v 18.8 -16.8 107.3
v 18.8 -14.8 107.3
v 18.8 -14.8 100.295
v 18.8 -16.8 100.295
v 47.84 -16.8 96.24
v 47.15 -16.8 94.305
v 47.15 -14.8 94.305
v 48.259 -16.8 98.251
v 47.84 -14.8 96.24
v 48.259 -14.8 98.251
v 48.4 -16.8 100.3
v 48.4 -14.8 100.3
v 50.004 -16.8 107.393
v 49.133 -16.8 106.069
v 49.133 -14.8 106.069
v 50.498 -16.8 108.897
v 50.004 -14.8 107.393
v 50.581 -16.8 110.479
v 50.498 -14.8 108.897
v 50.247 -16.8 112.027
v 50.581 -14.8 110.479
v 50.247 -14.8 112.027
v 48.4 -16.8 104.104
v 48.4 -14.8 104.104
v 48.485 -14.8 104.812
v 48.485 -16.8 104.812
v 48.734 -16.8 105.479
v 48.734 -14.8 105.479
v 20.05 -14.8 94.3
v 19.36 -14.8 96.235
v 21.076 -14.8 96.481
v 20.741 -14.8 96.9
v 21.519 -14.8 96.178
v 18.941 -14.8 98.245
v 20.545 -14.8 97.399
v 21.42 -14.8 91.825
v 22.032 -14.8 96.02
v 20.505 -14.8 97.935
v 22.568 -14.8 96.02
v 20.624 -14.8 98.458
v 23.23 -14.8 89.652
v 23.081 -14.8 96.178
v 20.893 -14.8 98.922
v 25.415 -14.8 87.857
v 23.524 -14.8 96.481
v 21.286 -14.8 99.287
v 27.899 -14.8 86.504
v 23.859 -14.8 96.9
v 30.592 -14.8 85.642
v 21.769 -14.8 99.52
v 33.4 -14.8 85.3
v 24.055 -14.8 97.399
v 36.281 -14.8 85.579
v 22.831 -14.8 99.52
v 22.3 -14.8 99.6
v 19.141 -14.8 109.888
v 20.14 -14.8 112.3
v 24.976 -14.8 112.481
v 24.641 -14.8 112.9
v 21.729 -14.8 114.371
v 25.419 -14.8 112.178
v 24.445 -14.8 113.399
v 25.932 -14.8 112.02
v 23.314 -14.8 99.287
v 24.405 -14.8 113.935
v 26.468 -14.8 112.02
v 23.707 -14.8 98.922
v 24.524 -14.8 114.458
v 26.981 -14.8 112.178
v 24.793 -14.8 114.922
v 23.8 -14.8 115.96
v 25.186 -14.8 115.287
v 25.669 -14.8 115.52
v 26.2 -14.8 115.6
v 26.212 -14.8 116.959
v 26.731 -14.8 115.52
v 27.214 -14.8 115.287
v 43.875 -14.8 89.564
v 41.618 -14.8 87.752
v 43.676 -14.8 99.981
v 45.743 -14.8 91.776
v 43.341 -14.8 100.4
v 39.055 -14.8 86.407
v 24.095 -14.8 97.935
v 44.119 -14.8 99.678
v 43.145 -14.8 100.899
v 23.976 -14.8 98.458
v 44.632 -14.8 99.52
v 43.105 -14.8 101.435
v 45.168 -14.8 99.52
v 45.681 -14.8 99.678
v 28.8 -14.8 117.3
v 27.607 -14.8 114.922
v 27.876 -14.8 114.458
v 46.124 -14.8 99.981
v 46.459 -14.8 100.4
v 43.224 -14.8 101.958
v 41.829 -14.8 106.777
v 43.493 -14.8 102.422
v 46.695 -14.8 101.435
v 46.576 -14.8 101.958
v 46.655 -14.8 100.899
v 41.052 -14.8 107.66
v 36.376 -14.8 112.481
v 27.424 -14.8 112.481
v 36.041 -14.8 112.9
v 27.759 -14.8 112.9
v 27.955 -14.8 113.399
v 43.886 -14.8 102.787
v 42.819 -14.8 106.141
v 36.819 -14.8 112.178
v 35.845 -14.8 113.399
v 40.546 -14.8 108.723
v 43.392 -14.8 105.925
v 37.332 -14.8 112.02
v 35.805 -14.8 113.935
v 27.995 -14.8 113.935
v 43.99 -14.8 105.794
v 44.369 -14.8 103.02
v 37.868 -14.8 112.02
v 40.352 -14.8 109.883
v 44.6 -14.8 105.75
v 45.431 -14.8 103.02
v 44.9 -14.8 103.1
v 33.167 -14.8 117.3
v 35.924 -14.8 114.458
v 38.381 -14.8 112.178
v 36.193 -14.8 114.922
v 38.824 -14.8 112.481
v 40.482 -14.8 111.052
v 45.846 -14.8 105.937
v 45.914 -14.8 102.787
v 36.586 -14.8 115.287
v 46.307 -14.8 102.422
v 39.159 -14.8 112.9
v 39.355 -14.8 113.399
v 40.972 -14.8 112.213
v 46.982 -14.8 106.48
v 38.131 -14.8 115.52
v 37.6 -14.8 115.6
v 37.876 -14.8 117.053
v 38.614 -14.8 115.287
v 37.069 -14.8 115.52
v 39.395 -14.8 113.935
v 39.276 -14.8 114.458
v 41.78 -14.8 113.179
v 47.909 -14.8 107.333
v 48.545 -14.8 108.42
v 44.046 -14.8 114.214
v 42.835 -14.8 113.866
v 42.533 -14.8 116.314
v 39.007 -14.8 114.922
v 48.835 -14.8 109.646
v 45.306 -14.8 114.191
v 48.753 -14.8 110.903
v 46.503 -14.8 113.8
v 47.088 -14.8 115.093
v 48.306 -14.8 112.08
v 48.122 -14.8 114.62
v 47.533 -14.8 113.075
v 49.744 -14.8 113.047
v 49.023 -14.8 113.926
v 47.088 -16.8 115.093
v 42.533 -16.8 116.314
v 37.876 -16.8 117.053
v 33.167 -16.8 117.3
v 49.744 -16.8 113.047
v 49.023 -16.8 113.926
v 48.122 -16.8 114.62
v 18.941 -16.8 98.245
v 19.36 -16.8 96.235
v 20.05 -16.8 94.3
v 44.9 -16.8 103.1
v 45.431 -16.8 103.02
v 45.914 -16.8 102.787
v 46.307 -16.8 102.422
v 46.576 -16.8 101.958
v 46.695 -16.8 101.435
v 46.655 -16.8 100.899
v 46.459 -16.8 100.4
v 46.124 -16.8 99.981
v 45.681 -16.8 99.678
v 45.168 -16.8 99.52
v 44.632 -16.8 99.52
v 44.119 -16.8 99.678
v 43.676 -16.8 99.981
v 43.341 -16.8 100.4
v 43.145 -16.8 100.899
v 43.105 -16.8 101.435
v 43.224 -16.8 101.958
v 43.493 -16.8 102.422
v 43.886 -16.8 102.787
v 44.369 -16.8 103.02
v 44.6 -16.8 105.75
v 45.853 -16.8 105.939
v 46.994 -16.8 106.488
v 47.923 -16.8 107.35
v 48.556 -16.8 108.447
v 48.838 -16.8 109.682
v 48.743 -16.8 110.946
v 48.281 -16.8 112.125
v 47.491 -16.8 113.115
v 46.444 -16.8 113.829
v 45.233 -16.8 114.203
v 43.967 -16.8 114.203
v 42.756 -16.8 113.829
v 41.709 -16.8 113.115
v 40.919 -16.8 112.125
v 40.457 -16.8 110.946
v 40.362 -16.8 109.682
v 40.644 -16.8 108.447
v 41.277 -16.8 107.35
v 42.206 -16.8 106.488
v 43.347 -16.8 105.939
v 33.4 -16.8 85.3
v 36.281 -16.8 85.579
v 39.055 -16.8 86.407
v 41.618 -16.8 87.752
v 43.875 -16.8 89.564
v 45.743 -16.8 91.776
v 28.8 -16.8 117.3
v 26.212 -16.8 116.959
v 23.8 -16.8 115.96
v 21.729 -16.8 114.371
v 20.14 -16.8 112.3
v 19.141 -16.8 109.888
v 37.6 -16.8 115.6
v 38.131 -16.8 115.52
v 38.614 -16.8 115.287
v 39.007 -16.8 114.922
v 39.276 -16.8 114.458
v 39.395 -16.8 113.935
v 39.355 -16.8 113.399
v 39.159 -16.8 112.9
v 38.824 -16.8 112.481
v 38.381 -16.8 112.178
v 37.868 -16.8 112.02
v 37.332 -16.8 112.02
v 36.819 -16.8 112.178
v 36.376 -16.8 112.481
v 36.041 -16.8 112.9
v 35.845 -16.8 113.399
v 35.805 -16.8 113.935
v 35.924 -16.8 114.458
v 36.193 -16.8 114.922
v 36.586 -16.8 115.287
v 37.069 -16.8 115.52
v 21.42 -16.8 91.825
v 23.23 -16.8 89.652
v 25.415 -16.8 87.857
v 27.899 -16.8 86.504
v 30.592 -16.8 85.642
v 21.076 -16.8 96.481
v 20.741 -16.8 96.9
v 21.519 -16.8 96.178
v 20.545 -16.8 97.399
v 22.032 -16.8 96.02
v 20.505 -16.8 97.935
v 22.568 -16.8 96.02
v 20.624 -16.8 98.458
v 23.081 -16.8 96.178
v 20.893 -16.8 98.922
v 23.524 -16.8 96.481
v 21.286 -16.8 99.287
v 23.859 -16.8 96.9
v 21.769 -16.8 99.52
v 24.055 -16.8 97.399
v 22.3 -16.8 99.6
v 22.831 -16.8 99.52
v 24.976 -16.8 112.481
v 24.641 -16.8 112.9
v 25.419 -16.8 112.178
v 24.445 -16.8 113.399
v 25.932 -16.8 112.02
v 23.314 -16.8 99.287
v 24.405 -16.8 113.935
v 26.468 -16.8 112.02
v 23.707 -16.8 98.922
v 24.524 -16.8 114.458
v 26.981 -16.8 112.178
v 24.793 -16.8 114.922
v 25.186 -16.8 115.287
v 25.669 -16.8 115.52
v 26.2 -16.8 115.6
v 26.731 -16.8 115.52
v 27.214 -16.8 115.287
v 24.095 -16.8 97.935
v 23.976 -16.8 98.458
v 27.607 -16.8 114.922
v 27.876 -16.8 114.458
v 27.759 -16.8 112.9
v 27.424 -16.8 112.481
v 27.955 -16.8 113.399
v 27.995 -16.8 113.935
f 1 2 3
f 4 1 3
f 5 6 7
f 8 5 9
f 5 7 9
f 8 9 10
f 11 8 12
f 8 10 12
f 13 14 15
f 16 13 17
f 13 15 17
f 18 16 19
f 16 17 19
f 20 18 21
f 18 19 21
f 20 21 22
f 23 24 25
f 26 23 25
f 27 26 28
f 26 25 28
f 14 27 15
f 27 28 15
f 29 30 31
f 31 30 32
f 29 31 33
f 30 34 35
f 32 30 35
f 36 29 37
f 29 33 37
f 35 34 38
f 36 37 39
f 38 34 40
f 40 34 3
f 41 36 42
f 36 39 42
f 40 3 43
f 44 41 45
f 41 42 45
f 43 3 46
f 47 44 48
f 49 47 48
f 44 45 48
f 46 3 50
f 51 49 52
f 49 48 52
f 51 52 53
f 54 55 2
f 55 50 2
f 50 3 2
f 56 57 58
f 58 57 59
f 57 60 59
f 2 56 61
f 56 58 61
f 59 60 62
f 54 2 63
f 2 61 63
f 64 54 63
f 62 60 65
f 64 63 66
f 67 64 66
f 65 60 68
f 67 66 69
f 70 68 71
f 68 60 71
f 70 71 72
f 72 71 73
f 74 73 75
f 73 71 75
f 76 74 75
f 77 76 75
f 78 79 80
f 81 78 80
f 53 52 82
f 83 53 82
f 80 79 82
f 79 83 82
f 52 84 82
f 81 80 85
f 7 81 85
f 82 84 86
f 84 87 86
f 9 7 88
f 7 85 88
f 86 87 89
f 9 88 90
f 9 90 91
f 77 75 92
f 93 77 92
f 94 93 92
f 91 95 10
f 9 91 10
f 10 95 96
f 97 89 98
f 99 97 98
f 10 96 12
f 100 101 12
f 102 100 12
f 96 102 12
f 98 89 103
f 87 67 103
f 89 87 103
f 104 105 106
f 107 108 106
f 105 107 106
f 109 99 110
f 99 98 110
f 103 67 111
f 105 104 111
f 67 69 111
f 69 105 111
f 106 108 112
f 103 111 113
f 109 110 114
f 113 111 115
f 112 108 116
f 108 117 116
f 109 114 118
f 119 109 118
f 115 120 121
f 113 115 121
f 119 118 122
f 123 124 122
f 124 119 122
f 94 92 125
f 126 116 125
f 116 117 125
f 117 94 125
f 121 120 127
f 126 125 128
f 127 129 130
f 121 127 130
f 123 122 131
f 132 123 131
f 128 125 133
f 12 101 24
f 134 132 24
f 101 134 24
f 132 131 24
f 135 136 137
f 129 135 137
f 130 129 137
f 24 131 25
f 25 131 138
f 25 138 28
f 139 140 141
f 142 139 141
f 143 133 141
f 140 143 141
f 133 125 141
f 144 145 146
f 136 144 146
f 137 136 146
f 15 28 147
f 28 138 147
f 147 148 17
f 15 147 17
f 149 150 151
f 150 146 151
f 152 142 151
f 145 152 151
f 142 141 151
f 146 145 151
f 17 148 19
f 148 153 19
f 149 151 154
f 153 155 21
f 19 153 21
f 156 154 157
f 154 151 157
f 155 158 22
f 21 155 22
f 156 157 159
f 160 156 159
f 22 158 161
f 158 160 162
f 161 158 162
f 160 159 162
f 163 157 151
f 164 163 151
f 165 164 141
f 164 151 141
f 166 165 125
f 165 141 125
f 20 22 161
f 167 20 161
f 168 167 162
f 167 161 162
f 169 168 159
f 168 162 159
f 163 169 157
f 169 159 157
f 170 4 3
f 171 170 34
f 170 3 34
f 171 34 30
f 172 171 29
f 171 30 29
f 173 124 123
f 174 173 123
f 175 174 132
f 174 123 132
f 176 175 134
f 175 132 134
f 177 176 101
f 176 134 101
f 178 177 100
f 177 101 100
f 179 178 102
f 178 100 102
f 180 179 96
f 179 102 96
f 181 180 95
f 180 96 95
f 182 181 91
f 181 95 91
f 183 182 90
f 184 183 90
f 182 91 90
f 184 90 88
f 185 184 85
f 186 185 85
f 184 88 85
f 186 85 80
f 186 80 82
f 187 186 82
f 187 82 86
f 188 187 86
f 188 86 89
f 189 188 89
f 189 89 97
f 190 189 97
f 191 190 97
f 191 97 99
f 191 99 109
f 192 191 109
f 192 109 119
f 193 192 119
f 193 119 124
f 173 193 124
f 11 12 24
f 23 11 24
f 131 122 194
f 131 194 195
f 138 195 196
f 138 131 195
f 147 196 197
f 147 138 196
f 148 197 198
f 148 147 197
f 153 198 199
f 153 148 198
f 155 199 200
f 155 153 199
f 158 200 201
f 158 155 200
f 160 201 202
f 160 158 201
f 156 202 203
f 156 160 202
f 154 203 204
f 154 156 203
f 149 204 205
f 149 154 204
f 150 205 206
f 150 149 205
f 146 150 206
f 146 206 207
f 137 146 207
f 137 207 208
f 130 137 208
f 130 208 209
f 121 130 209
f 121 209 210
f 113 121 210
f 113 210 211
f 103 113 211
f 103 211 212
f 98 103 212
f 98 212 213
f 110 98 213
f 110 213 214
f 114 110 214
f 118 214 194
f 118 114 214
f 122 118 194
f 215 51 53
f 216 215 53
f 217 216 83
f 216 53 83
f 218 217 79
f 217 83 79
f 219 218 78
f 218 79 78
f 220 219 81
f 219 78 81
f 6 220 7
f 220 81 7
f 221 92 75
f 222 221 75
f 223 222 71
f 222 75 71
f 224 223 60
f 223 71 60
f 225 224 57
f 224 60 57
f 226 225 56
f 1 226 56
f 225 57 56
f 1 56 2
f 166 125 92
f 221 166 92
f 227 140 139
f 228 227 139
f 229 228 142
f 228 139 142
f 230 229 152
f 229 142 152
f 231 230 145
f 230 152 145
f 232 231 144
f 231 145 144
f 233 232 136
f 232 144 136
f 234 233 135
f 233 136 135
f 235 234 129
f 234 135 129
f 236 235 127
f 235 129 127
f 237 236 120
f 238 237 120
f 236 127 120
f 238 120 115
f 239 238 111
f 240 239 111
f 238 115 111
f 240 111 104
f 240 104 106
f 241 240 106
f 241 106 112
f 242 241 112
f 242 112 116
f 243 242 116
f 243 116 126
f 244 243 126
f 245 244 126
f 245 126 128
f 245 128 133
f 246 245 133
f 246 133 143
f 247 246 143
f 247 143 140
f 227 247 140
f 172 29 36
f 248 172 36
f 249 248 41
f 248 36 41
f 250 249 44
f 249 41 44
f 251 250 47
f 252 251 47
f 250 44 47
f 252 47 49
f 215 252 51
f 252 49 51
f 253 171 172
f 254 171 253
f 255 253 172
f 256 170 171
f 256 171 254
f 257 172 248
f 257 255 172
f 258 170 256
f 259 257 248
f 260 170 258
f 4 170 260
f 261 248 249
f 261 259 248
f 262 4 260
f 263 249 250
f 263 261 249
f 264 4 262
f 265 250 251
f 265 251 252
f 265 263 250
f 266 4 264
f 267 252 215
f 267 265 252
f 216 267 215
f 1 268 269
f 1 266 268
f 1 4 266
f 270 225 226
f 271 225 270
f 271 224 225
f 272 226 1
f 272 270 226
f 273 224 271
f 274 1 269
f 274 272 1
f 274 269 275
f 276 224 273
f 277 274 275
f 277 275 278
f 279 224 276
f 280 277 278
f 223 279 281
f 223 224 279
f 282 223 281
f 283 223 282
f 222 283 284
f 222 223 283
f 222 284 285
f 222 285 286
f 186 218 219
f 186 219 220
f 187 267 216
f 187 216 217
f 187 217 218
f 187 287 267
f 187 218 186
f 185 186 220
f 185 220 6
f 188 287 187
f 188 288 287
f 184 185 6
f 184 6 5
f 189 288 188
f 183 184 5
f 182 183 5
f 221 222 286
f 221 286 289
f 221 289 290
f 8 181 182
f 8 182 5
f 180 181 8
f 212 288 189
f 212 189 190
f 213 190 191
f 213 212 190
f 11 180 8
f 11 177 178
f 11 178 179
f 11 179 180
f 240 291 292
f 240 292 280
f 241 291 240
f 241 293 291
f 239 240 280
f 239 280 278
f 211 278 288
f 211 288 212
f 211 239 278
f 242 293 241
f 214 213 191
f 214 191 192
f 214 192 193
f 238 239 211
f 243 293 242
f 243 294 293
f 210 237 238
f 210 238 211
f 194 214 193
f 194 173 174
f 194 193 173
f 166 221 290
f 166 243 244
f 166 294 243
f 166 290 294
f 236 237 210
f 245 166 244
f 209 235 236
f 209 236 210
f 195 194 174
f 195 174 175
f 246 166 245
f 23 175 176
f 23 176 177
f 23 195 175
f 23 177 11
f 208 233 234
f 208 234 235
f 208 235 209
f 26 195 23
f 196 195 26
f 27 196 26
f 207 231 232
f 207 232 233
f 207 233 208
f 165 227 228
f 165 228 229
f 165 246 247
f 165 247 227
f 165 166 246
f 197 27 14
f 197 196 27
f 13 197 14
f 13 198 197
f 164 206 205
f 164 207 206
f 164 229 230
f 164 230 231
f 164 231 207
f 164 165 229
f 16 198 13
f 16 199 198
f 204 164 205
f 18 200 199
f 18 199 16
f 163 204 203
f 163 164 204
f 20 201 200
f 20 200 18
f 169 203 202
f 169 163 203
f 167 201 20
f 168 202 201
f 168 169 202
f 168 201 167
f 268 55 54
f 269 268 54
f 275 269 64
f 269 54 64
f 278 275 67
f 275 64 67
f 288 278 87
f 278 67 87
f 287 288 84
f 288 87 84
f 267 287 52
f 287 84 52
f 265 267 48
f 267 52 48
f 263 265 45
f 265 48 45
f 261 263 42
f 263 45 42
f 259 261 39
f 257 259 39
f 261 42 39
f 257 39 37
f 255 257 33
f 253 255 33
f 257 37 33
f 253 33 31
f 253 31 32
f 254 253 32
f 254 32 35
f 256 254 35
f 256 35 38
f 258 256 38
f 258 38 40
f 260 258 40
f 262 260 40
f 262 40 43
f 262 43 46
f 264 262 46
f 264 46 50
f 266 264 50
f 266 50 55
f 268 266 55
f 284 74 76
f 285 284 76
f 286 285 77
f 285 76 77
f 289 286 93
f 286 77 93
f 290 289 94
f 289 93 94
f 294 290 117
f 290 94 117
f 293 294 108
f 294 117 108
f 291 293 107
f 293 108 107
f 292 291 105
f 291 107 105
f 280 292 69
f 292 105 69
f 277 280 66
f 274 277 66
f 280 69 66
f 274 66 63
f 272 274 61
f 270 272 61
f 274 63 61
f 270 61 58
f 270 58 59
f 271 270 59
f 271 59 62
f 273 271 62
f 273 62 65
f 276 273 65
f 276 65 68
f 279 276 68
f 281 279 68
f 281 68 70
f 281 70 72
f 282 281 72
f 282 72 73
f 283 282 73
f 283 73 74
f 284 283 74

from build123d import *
from build123d.topology import SkipClean

# Parameters (mm, degrees)
SZKIC1_W                    = 15.6
SZKIC1_H                    = 25
SZKIC1_R                    = 1.8
SZKIC1_R_2                  = 1.5
DODANIE_WYCI_GNI_CIE1_DEPTH = 3
DODANIE_WYCI_GNI_CIE2_START = -10.5
SZKIC1_3_R                  = 1.8
SZKIC1_3_R_2                = 1.5
DODANIE_WYCI_GNI_CIE2_DEPTH = 10.5
ZAOKR_GLENIE1_R             = 10
ZAOKR_GLENIE6_R             = 45
ZAOKR_GLENIE7_R             = 5
ZAOKR_GLENIE8_R             = 15
ZAOKR_GLENIE10_R            = 0.2
SZKIC5_R                    = 4.25
WYTNIJ_WYCI_GNI_CIE3_DEPTH  = 1
ZAOKR_GLENIE11_R            = 1
ZAOKR_GLENIE12_START        = -10.5
ZAOKR_GLENIE12_DEPTH        = 13.5
ZAOKR_GLENIE13_R            = 3
DODANIE_WYCI_GNI_CIE3_START = 4.3
SZKIC8_R                    = 1.5
DODANIE_WYCI_GNI_CIE3_DEPTH = 4.3
WYTNIJ_WYCI_GNI_CIE5_DEPTH  = 129.982518339
SZKIC10_R                   = 3.3
WYTNIJ_WYCI_GNI_CIE6_DEPTH  = 1.6
SZKIC11_R                   = 1.8
DODANIE_WYCI_GNI_CIE4_DEPTH = 0.2
SZKIC12_R                   = 1.5
SZKIC12_R_2                 = 1.8
SZKIC12_R_3                 = 3.3
DODANIE_WYCI_GNI_CIE5_DEPTH = 0.2
ZAOKR_GLENIE14_R            = 3
SZKIC13_R                   = 1.5
SZKIC13_R_2                 = 4.25
DODANIE_WYCI_GNI_CIE6_DEPTH = 2
WYTNIJ_WYCI_GNI_CIE7_START  = -19.8
WYTNIJ_WYCI_GNI_CIE7_DEPTH  = 17.8
SZKIC15_R                   = 1.8
WYTNIJ_WYCI_GNI_CIE8_DEPTH  = 128.764040324


with BuildPart() as part:
    # Szkic1 → Dodanie-wyciągnięcie1 (new body)
    # profile 1 of 2: a face of its own
    with BuildSketch(Plane(origin=(0, 0, 0), x_dir=(1, 0, 0), z_dir=(0, 1, 0))):
        with Locations((4, -97.8)):
            Rectangle(SZKIC1_W, SZKIC1_H)
        with Locations(Location((4, -105.3, 0), (0, 0, 270))):
            Circle(SZKIC1_R, mode=Mode.SUBTRACT)
        with Locations(Location((4, -90.3, 0), (0, 0, 270))):
            Circle(SZKIC1_R, mode=Mode.SUBTRACT)
    # profile 2 of 2: a face of its own
    with BuildSketch(Plane(origin=(0, 0, 0), x_dir=(1, 0, 0), z_dir=(0, 1, 0))):
        with BuildLine():
            Line((11.8, -110.3), (-3.8, -110.3))
            Line((-3.8, -110.3), (-3.8, -85.3))
            Line((-3.8, -85.3), (-10.8, -85.3))
            Line((-10.8, -85.3), (-10.8, -105.356725294))
            ThreePointArc((-10.8, -105.356725294), (-13, -110), (-10.8, -114.643274706))
            Line((-10.8, -114.643274706), (-10.8, -117.3))
            Line((-10.8, -117.3), (18.8, -117.3))
            Line((18.8, -117.3), (18.8, -85.3))
            Line((18.8, -85.3), (11.8, -85.3))
            Line((11.8, -85.3), (11.8, -110.3))
        make_face()
        with Locations(Location((-7, -110, 0), (0, 0, 270))):
            Circle(SZKIC1_R, mode=Mode.SUBTRACT)
        with Locations(Location((0, -113.8, 0), (0, 0, 270))):
            Circle(SZKIC1_R_2, mode=Mode.SUBTRACT)
        with Locations(Location((11.4, -113.8, 0), (0, 0, 270))):
            Circle(SZKIC1_R_2, mode=Mode.SUBTRACT)
        with Locations(Location((-7.3, -101.3, 0), (0, 0, 270))):
            Circle(SZKIC1_R_2, mode=Mode.SUBTRACT)
        with Locations(Location((15.3, -97.8, 0), (0, 0, 270))):
            Circle(SZKIC1_R_2, mode=Mode.SUBTRACT)
    extrude(amount=DODANIE_WYCI_GNI_CIE1_DEPTH)

    # Szkic1<3> → Dodanie-wyciągnięcie2 (add)
    with BuildSketch(Plane(origin=(0, 0, 0), x_dir=(1, 0, 0), z_dir=(0, 1, 0)).offset(DODANIE_WYCI_GNI_CIE2_START)):
        with BuildLine():
            Line((11.8, -110.3), (-3.8, -110.3))
            Line((-3.8, -110.3), (-3.8, -85.3))
            Line((-3.8, -85.3), (-10.8, -85.3))
            Line((-10.8, -85.3), (-10.8, -105.356725294))
            ThreePointArc((-10.8, -105.356725294), (-13, -110), (-10.8, -114.643274706))
            Line((-10.8, -114.643274706), (-10.8, -117.3))
            Line((-10.8, -117.3), (18.8, -117.3))
            Line((18.8, -117.3), (18.8, -85.3))
            Line((18.8, -85.3), (11.8, -85.3))
            Line((11.8, -85.3), (11.8, -110.3))
        make_face()
        with Locations(Location((-7, -110, 0), (0, 0, 270))):
            Circle(SZKIC1_3_R, mode=Mode.SUBTRACT)
        with Locations(Location((0, -113.8, 0), (0, 0, 270))):
            Circle(SZKIC1_3_R_2, mode=Mode.SUBTRACT)
        with Locations(Location((11.4, -113.8, 0), (0, 0, 270))):
            Circle(SZKIC1_3_R_2, mode=Mode.SUBTRACT)
        with Locations(Location((-7.3, -101.3, 0), (0, 0, 270))):
            Circle(SZKIC1_3_R_2, mode=Mode.SUBTRACT)
        with Locations(Location((15.3, -97.8, 0), (0, 0, 270))):
            Circle(SZKIC1_3_R_2, mode=Mode.SUBTRACT)
    extrude(amount=DODANIE_WYCI_GNI_CIE2_DEPTH)

    # Zaokrąglenie1
    zaokr_glenie1_edges = [part.edges().sort_by_distance(p)[0] for p in [
        (18.8, -3.75, 117.3),
    ]]
    fillet(zaokr_glenie1_edges, radius=ZAOKR_GLENIE1_R)

    # Zaokrąglenie6
    # the kernel refuses this fillet: 45 mm, written as the material it takes off along each edge
    with BuildSketch(Plane(origin=(-10.8, 41.082729611, 117.3), x_dir=(1, 0, 0), z_dir=(0, -1, 0))) as zaokr_glenie6_piece_1:
        with BuildLine():
            CenterArc((15.233091844, -45), ZAOKR_GLENIE6_R, 90, 19.78631313)
            Line((0, -2.656725294), (0, 0))
            Line((0, 0), (15.233091844, 0))
        make_face()
    extrude(amount=89.665459221, mode=Mode.SUBTRACT)

    # Zaokrąglenie7
    zaokr_glenie7_edges = [part.edges().sort_by_distance(p)[0] for p in [
        (-10.8, -3.75, 114.643274706),
    ]]
    fillet(zaokr_glenie7_edges, radius=ZAOKR_GLENIE7_R)

    # Zaokrąglenie8
    zaokr_glenie8_edges = [part.edges().sort_by_distance(p)[0] for p in [
        (-10.8, -3.75, 85.3),
    ]]
    fillet(zaokr_glenie8_edges, radius=ZAOKR_GLENIE8_R)

    # Zaokrąglenie10
    zaokr_glenie10_edges = [part.edges().sort_by_distance(p)[0] for p in [
        (-3.8, -5.25, 110.3),
        (11.8, -5.25, 110.3),
    ]]
    fillet(zaokr_glenie10_edges, radius=ZAOKR_GLENIE10_R)

    # Szkic5 → Wytnij-wyciągnięcie3 (cut)
    with BuildSketch(Plane.XZ.offset(10.5)):
        with Locations((-7, 110)):
            Circle(SZKIC5_R)
    extrude(amount=-WYTNIJ_WYCI_GNI_CIE3_DEPTH, mode=Mode.SUBTRACT)

    # Zaokrąglenie11
    zaokr_glenie11_edges = [part.edges().sort_by_distance(p)[0] for p in [
        (-3.8, -10, 107.203126746),
        (-2.760601458, -10, 110.3),
    ]]
    fillet(zaokr_glenie11_edges, radius=ZAOKR_GLENIE11_R)

    # Zaokrąglenie12: read off the stored shape, not the designer's step
    # Zaokrąglenie12 outline → Zaokrąglenie12 (cut)
    with BuildSketch(Plane(origin=(0, 0, 0), x_dir=(1, 0, 0), z_dir=(0, 1, 0)).offset(ZAOKR_GLENIE12_START)):
        with BuildLine():
            Line((18.8, -85.3), (4.2, -85.3))
            ThreePointArc((4.2, -85.3), (14.54709263, -89.83044095), (18.8, -100.294665718))
            Line((18.8, -100.294665718), (18.8, -85.3))
        make_face()
    extrude(amount=ZAOKR_GLENIE12_DEPTH, mode=Mode.SUBTRACT)

    # Zaokrąglenie13
    zaokr_glenie13_edges = [part.edges().sort_by_distance(p)[0] for p in [
        (-3.8, -5.25, 87.61142246),
        (11.8, -5.25, 87.606088178),
    ]]
    fillet(zaokr_glenie13_edges, radius=ZAOKR_GLENIE13_R)

    # Szkic8 → Dodanie-wyciągnięcie3 (add)
    with SkipClean():  # the faces are left unmerged after this step: merging them gives an invalid solid
        with BuildSketch(Plane.XZ.offset(10.5).offset(DODANIE_WYCI_GNI_CIE3_START)):
            with BuildLine():
                Line((-3.8, 95.504168477), (-3.8, 105.233187648))
                ThreePointArc((-3.8, 105.233187648), (-4.261041569, 106.075520011), (-5.219047619, 106.141151905))
                ThreePointArc((-5.219047619, 106.141151905), (-10.837760193, 111.825950903), (-2.88235573, 111.052380952))
                ThreePointArc((-2.88235573, 111.052380952), (-2.52684194, 110.510183867), (-1.913498255, 110.3))
                Line((-1.913498255, 110.3), (11.6, 110.3))
                ThreePointArc((11.6, 110.3), (11.741421356, 110.241421356), (11.8, 110.1))
                Line((11.8, 110.1), (11.8, 95.498834195))
                ThreePointArc((11.8, 95.498834195), (14.187627564, 92.561999164), (17.55, 94.299876314))
                ThreePointArc((17.55, 94.299876314), (18.484175156, 97.23280354), (18.8, 100.294665718))
                Line((18.8, 100.294665718), (18.8, 107.3))
                ThreePointArc((18.8, 107.3), (15.871067812, 114.371067812), (8.8, 117.3))
                Line((8.8, 117.3), (4.433091844, 117.3))
                ThreePointArc((4.433091844, 117.3), (-2.614414646, 116.744714559), (-9.487993237, 115.092562323))
                ThreePointArc((-9.487993237, 115.092562323), (-11.423138006, 113.926168381), (-12.647236034, 112.026999056))
                ThreePointArc((-12.647236034, 112.026999056), (-12.782361558, 108.398658434), (-10.8, 105.356725294))
                Line((-10.8, 105.356725294), (-10.8, 100.3))
                ThreePointArc((-10.8, 100.3), (-10.484175156, 97.238137822), (-9.55, 94.305210596))
                ThreePointArc((-9.55, 94.305210596), (-6.187627564, 92.567333446), (-3.8, 95.504168477))
            make_face()
            with Locations(Location((15.3, 97.8, 0), (0, 0, 270))):
                Circle(SZKIC8_R, mode=Mode.SUBTRACT)
            with Locations(Location((11.4, 113.8, 0), (0, 0, 270))):
                Circle(SZKIC8_R, mode=Mode.SUBTRACT)
            with Locations(Location((-7.3, 101.3, 0), (0, 0, 270))):
                Circle(SZKIC8_R, mode=Mode.SUBTRACT)
            with Locations(Location((0, 113.8, 0), (0, 0, 270))):
                Circle(SZKIC8_R, mode=Mode.SUBTRACT)
        extrude(amount=-DODANIE_WYCI_GNI_CIE3_DEPTH)


with BuildPart() as body_2:
    # Lustro1: mirrored copy
    add(part.part.mirror(Plane(origin=(18.8, 3, 0), x_dir=(0, 0, 1), z_dir=(1, 0, 0))))

    # Szkic10 → Wytnij-wyciągnięcie6 (cut)
    with BuildSketch(Plane(origin=(0, 3, 0), x_dir=(1, 0, 0), z_dir=(0, 1, 0))):
        with Locations(Location((33.6, -105.3, 0), (0, 0, 270))):
            Circle(SZKIC10_R)
        with Locations(Location((33.6, -90.3, 0), (0, 0, 270))):
            Circle(SZKIC10_R)
    extrude(amount=-WYTNIJ_WYCI_GNI_CIE6_DEPTH, mode=Mode.SUBTRACT)

    # Szkic11 → Dodanie-wyciągnięcie4 (add)
    with BuildSketch(Plane(origin=(0, 1.4, 0), x_dir=(1, 0, 0), z_dir=(0, 1, 0))):
        with Locations(Location((33.6, -90.3, 0), (0, 0, 270))):
            Circle(SZKIC11_R)
        with Locations(Location((33.6, -105.3, 0), (0, 0, 270))):
            Circle(SZKIC11_R)
    extrude(amount=-DODANIE_WYCI_GNI_CIE4_DEPTH)

    # Szkic12 → Dodanie-wyciągnięcie5 (add)
    with BuildSketch(Plane(origin=(0, 3, 0), x_dir=(1, 0, 0), z_dir=(0, 1, 0))):
        with Locations(Location((44.9, -101.3, 0), (0, 0, 90))):
            Circle(SZKIC12_R)
        with Locations(Location((44.6, -110, 0), (0, 0, 90))):
            Circle(SZKIC12_R_2)
        with Locations(Location((37.6, -113.8, 0), (0, 0, 90))):
            Circle(SZKIC12_R)
        with Locations(Location((22.3, -97.8, 0), (0, 0, 90))):
            Circle(SZKIC12_R)
        with Locations(Location((26.2, -113.8, 0), (0, 0, 90))):
            Circle(SZKIC12_R)
        with Locations(Location((33.6, -90.3, 0), (0, 0, 270))):
            Circle(SZKIC12_R_3)
        with Locations(Location((33.6, -105.3, 0), (0, 0, 270))):
            Circle(SZKIC12_R_3)
    extrude(amount=-DODANIE_WYCI_GNI_CIE5_DEPTH)

    # Zaokrąglenie14
    zaokr_glenie14_edges = [body_2.edges().sort_by_distance(p)[0] for p in [
        (48.4, -3.75, 105.356725294),
    ]]
    fillet(zaokr_glenie14_edges, radius=ZAOKR_GLENIE14_R)

    # Szkic13 → Dodanie-wyciągnięcie6 (add)
    with BuildSketch(Plane.XZ.offset(14.8)):
        with BuildLine():
            Line((48.4, 100.3), (48.4, 104.104238811))
            ThreePointArc((48.4, 104.104238811), (48.589306135, 105.153047659), (49.133333333, 106.069492541))
            ThreePointArc((49.133333333, 106.069492541), (50.497793582, 108.897262104), (50.247236034, 112.026999056))
            ThreePointArc((50.247236034, 112.026999056), (49.023138006, 113.926168381), (47.087993237, 115.092562323))
            ThreePointArc((47.087993237, 115.092562323), (40.214414646, 116.744714559), (33.166908156, 117.3))
            Line((33.166908156, 117.3), (28.8, 117.3))
            ThreePointArc((28.8, 117.3), (21.728932188, 114.371067812), (18.8, 107.3))
            Line((18.8, 107.3), (18.8, 100.294665718))
            ThreePointArc((18.8, 100.294665718), (19.115824844, 97.23280354), (20.05, 94.299876314))
            ThreePointArc((20.05, 94.299876314), (25.41518823, 87.857023997), (33.4, 85.3))
            ThreePointArc((33.4, 85.3), (41.618216319, 87.751656662), (47.15, 94.305210596))
            ThreePointArc((47.15, 94.305210596), (48.084175156, 97.238137822), (48.4, 100.3))
        make_face()
        with Locations(Location((22.3, 97.8, 0), (0, 0, 270))):
            Circle(SZKIC13_R, mode=Mode.SUBTRACT)
        with Locations(Location((26.2, 113.8, 0), (0, 0, 270))):
            Circle(SZKIC13_R, mode=Mode.SUBTRACT)
        with Locations(Location((44.9, 101.3, 0), (0, 0, 270))):
            Circle(SZKIC13_R, mode=Mode.SUBTRACT)
        with Locations(Location((37.6, 113.8, 0), (0, 0, 270))):
            Circle(SZKIC13_R, mode=Mode.SUBTRACT)
        with Locations(Location((44.6, 110, 0), (0, 0, 270))):
            Circle(SZKIC13_R_2, mode=Mode.SUBTRACT)
    extrude(amount=DODANIE_WYCI_GNI_CIE6_DEPTH)

    # Szkic14 → Wytnij-wyciągnięcie7 (cut)
    with BuildSketch(Plane.XZ.offset(16.8).offset(WYTNIJ_WYCI_GNI_CIE7_START)):
        with BuildLine():
            Line((48.4, 100.3), (48.4, 104.104238811))
            ThreePointArc((48.4, 104.104238811), (48.589306135, 105.153047659), (49.133333333, 106.069492541))
            ThreePointArc((49.133333333, 106.069492541), (50.497793582, 108.897262104), (50.247236034, 112.026999056))
            ThreePointArc((50.247236034, 112.026999056), (49.023138006, 113.926168381), (47.087993237, 115.092562323))
            ThreePointArc((47.087993237, 115.092562323), (40.214414646, 116.744714559), (33.166908156, 117.3))
            Line((33.166908156, 117.3), (28.8, 117.3))
            ThreePointArc((28.8, 117.3), (21.728932188, 114.371067812), (18.8, 107.3))
            Line((18.8, 107.3), (18.8, 100.294665718))
            ThreePointArc((18.8, 100.294665718), (23.05290737, 89.83044095), (33.4, 85.3))
            ThreePointArc((33.4, 85.3), (44.006601718, 89.693398282), (48.4, 100.3))
        make_face()
    extrude(amount=WYTNIJ_WYCI_GNI_CIE7_DEPTH, mode=Mode.SUBTRACT)

    # Szkic15 → Wytnij-wyciągnięcie8 (cut, through all)
    with BuildSketch(Plane(origin=(0, -14.8, 0), x_dir=(1, 0, 0), z_dir=(0, 1, 0))):
        with Locations(Location((37.6, -113.8, 0), (0, 0, 270))):
            Circle(SZKIC15_R)
        with Locations(Location((26.2, -113.8, 0), (0, 0, 270))):
            Circle(SZKIC15_R)
        with Locations(Location((22.3, -97.8, 0), (0, 0, 270))):
            Circle(SZKIC15_R)
        with Locations(Location((44.9, -101.3, 0), (0, 0, 270))):
            Circle(SZKIC15_R)
    extrude(amount=-WYTNIJ_WYCI_GNI_CIE8_DEPTH, mode=Mode.SUBTRACT)


with BuildPart() as part_1:
    add(part.part)

    # Szkic9 → Wytnij-wyciągnięcie5 (cut, through all)
    with BuildSketch(Plane.XZ.offset(14.8)):
        with BuildLine():
            Line((18.8, 100.294665718), (18.8, 107.3))
            ThreePointArc((18.8, 107.3), (15.871067812, 114.371067812), (8.8, 117.3))
            Line((8.8, 117.3), (4.433091844, 117.3))
            ThreePointArc((4.433091844, 117.3), (-2.614414646, 116.744714559), (-9.487993237, 115.092562323))
            ThreePointArc((-9.487993237, 115.092562323), (-11.423138006, 113.926168381), (-12.647236034, 112.026999056))
            ThreePointArc((-12.647236034, 112.026999056), (-12.782361558, 108.398658434), (-10.8, 105.356725294))
            Line((-10.8, 105.356725294), (-10.8, 100.3))
            ThreePointArc((-10.8, 100.3), (-6.406601718, 89.693398282), (4.2, 85.3))
            ThreePointArc((4.2, 85.3), (14.54709263, 89.83044095), (18.8, 100.294665718))
        make_face()
    extrude(amount=-WYTNIJ_WYCI_GNI_CIE5_DEPTH, mode=Mode.SUBTRACT)


solid = body_2.part
